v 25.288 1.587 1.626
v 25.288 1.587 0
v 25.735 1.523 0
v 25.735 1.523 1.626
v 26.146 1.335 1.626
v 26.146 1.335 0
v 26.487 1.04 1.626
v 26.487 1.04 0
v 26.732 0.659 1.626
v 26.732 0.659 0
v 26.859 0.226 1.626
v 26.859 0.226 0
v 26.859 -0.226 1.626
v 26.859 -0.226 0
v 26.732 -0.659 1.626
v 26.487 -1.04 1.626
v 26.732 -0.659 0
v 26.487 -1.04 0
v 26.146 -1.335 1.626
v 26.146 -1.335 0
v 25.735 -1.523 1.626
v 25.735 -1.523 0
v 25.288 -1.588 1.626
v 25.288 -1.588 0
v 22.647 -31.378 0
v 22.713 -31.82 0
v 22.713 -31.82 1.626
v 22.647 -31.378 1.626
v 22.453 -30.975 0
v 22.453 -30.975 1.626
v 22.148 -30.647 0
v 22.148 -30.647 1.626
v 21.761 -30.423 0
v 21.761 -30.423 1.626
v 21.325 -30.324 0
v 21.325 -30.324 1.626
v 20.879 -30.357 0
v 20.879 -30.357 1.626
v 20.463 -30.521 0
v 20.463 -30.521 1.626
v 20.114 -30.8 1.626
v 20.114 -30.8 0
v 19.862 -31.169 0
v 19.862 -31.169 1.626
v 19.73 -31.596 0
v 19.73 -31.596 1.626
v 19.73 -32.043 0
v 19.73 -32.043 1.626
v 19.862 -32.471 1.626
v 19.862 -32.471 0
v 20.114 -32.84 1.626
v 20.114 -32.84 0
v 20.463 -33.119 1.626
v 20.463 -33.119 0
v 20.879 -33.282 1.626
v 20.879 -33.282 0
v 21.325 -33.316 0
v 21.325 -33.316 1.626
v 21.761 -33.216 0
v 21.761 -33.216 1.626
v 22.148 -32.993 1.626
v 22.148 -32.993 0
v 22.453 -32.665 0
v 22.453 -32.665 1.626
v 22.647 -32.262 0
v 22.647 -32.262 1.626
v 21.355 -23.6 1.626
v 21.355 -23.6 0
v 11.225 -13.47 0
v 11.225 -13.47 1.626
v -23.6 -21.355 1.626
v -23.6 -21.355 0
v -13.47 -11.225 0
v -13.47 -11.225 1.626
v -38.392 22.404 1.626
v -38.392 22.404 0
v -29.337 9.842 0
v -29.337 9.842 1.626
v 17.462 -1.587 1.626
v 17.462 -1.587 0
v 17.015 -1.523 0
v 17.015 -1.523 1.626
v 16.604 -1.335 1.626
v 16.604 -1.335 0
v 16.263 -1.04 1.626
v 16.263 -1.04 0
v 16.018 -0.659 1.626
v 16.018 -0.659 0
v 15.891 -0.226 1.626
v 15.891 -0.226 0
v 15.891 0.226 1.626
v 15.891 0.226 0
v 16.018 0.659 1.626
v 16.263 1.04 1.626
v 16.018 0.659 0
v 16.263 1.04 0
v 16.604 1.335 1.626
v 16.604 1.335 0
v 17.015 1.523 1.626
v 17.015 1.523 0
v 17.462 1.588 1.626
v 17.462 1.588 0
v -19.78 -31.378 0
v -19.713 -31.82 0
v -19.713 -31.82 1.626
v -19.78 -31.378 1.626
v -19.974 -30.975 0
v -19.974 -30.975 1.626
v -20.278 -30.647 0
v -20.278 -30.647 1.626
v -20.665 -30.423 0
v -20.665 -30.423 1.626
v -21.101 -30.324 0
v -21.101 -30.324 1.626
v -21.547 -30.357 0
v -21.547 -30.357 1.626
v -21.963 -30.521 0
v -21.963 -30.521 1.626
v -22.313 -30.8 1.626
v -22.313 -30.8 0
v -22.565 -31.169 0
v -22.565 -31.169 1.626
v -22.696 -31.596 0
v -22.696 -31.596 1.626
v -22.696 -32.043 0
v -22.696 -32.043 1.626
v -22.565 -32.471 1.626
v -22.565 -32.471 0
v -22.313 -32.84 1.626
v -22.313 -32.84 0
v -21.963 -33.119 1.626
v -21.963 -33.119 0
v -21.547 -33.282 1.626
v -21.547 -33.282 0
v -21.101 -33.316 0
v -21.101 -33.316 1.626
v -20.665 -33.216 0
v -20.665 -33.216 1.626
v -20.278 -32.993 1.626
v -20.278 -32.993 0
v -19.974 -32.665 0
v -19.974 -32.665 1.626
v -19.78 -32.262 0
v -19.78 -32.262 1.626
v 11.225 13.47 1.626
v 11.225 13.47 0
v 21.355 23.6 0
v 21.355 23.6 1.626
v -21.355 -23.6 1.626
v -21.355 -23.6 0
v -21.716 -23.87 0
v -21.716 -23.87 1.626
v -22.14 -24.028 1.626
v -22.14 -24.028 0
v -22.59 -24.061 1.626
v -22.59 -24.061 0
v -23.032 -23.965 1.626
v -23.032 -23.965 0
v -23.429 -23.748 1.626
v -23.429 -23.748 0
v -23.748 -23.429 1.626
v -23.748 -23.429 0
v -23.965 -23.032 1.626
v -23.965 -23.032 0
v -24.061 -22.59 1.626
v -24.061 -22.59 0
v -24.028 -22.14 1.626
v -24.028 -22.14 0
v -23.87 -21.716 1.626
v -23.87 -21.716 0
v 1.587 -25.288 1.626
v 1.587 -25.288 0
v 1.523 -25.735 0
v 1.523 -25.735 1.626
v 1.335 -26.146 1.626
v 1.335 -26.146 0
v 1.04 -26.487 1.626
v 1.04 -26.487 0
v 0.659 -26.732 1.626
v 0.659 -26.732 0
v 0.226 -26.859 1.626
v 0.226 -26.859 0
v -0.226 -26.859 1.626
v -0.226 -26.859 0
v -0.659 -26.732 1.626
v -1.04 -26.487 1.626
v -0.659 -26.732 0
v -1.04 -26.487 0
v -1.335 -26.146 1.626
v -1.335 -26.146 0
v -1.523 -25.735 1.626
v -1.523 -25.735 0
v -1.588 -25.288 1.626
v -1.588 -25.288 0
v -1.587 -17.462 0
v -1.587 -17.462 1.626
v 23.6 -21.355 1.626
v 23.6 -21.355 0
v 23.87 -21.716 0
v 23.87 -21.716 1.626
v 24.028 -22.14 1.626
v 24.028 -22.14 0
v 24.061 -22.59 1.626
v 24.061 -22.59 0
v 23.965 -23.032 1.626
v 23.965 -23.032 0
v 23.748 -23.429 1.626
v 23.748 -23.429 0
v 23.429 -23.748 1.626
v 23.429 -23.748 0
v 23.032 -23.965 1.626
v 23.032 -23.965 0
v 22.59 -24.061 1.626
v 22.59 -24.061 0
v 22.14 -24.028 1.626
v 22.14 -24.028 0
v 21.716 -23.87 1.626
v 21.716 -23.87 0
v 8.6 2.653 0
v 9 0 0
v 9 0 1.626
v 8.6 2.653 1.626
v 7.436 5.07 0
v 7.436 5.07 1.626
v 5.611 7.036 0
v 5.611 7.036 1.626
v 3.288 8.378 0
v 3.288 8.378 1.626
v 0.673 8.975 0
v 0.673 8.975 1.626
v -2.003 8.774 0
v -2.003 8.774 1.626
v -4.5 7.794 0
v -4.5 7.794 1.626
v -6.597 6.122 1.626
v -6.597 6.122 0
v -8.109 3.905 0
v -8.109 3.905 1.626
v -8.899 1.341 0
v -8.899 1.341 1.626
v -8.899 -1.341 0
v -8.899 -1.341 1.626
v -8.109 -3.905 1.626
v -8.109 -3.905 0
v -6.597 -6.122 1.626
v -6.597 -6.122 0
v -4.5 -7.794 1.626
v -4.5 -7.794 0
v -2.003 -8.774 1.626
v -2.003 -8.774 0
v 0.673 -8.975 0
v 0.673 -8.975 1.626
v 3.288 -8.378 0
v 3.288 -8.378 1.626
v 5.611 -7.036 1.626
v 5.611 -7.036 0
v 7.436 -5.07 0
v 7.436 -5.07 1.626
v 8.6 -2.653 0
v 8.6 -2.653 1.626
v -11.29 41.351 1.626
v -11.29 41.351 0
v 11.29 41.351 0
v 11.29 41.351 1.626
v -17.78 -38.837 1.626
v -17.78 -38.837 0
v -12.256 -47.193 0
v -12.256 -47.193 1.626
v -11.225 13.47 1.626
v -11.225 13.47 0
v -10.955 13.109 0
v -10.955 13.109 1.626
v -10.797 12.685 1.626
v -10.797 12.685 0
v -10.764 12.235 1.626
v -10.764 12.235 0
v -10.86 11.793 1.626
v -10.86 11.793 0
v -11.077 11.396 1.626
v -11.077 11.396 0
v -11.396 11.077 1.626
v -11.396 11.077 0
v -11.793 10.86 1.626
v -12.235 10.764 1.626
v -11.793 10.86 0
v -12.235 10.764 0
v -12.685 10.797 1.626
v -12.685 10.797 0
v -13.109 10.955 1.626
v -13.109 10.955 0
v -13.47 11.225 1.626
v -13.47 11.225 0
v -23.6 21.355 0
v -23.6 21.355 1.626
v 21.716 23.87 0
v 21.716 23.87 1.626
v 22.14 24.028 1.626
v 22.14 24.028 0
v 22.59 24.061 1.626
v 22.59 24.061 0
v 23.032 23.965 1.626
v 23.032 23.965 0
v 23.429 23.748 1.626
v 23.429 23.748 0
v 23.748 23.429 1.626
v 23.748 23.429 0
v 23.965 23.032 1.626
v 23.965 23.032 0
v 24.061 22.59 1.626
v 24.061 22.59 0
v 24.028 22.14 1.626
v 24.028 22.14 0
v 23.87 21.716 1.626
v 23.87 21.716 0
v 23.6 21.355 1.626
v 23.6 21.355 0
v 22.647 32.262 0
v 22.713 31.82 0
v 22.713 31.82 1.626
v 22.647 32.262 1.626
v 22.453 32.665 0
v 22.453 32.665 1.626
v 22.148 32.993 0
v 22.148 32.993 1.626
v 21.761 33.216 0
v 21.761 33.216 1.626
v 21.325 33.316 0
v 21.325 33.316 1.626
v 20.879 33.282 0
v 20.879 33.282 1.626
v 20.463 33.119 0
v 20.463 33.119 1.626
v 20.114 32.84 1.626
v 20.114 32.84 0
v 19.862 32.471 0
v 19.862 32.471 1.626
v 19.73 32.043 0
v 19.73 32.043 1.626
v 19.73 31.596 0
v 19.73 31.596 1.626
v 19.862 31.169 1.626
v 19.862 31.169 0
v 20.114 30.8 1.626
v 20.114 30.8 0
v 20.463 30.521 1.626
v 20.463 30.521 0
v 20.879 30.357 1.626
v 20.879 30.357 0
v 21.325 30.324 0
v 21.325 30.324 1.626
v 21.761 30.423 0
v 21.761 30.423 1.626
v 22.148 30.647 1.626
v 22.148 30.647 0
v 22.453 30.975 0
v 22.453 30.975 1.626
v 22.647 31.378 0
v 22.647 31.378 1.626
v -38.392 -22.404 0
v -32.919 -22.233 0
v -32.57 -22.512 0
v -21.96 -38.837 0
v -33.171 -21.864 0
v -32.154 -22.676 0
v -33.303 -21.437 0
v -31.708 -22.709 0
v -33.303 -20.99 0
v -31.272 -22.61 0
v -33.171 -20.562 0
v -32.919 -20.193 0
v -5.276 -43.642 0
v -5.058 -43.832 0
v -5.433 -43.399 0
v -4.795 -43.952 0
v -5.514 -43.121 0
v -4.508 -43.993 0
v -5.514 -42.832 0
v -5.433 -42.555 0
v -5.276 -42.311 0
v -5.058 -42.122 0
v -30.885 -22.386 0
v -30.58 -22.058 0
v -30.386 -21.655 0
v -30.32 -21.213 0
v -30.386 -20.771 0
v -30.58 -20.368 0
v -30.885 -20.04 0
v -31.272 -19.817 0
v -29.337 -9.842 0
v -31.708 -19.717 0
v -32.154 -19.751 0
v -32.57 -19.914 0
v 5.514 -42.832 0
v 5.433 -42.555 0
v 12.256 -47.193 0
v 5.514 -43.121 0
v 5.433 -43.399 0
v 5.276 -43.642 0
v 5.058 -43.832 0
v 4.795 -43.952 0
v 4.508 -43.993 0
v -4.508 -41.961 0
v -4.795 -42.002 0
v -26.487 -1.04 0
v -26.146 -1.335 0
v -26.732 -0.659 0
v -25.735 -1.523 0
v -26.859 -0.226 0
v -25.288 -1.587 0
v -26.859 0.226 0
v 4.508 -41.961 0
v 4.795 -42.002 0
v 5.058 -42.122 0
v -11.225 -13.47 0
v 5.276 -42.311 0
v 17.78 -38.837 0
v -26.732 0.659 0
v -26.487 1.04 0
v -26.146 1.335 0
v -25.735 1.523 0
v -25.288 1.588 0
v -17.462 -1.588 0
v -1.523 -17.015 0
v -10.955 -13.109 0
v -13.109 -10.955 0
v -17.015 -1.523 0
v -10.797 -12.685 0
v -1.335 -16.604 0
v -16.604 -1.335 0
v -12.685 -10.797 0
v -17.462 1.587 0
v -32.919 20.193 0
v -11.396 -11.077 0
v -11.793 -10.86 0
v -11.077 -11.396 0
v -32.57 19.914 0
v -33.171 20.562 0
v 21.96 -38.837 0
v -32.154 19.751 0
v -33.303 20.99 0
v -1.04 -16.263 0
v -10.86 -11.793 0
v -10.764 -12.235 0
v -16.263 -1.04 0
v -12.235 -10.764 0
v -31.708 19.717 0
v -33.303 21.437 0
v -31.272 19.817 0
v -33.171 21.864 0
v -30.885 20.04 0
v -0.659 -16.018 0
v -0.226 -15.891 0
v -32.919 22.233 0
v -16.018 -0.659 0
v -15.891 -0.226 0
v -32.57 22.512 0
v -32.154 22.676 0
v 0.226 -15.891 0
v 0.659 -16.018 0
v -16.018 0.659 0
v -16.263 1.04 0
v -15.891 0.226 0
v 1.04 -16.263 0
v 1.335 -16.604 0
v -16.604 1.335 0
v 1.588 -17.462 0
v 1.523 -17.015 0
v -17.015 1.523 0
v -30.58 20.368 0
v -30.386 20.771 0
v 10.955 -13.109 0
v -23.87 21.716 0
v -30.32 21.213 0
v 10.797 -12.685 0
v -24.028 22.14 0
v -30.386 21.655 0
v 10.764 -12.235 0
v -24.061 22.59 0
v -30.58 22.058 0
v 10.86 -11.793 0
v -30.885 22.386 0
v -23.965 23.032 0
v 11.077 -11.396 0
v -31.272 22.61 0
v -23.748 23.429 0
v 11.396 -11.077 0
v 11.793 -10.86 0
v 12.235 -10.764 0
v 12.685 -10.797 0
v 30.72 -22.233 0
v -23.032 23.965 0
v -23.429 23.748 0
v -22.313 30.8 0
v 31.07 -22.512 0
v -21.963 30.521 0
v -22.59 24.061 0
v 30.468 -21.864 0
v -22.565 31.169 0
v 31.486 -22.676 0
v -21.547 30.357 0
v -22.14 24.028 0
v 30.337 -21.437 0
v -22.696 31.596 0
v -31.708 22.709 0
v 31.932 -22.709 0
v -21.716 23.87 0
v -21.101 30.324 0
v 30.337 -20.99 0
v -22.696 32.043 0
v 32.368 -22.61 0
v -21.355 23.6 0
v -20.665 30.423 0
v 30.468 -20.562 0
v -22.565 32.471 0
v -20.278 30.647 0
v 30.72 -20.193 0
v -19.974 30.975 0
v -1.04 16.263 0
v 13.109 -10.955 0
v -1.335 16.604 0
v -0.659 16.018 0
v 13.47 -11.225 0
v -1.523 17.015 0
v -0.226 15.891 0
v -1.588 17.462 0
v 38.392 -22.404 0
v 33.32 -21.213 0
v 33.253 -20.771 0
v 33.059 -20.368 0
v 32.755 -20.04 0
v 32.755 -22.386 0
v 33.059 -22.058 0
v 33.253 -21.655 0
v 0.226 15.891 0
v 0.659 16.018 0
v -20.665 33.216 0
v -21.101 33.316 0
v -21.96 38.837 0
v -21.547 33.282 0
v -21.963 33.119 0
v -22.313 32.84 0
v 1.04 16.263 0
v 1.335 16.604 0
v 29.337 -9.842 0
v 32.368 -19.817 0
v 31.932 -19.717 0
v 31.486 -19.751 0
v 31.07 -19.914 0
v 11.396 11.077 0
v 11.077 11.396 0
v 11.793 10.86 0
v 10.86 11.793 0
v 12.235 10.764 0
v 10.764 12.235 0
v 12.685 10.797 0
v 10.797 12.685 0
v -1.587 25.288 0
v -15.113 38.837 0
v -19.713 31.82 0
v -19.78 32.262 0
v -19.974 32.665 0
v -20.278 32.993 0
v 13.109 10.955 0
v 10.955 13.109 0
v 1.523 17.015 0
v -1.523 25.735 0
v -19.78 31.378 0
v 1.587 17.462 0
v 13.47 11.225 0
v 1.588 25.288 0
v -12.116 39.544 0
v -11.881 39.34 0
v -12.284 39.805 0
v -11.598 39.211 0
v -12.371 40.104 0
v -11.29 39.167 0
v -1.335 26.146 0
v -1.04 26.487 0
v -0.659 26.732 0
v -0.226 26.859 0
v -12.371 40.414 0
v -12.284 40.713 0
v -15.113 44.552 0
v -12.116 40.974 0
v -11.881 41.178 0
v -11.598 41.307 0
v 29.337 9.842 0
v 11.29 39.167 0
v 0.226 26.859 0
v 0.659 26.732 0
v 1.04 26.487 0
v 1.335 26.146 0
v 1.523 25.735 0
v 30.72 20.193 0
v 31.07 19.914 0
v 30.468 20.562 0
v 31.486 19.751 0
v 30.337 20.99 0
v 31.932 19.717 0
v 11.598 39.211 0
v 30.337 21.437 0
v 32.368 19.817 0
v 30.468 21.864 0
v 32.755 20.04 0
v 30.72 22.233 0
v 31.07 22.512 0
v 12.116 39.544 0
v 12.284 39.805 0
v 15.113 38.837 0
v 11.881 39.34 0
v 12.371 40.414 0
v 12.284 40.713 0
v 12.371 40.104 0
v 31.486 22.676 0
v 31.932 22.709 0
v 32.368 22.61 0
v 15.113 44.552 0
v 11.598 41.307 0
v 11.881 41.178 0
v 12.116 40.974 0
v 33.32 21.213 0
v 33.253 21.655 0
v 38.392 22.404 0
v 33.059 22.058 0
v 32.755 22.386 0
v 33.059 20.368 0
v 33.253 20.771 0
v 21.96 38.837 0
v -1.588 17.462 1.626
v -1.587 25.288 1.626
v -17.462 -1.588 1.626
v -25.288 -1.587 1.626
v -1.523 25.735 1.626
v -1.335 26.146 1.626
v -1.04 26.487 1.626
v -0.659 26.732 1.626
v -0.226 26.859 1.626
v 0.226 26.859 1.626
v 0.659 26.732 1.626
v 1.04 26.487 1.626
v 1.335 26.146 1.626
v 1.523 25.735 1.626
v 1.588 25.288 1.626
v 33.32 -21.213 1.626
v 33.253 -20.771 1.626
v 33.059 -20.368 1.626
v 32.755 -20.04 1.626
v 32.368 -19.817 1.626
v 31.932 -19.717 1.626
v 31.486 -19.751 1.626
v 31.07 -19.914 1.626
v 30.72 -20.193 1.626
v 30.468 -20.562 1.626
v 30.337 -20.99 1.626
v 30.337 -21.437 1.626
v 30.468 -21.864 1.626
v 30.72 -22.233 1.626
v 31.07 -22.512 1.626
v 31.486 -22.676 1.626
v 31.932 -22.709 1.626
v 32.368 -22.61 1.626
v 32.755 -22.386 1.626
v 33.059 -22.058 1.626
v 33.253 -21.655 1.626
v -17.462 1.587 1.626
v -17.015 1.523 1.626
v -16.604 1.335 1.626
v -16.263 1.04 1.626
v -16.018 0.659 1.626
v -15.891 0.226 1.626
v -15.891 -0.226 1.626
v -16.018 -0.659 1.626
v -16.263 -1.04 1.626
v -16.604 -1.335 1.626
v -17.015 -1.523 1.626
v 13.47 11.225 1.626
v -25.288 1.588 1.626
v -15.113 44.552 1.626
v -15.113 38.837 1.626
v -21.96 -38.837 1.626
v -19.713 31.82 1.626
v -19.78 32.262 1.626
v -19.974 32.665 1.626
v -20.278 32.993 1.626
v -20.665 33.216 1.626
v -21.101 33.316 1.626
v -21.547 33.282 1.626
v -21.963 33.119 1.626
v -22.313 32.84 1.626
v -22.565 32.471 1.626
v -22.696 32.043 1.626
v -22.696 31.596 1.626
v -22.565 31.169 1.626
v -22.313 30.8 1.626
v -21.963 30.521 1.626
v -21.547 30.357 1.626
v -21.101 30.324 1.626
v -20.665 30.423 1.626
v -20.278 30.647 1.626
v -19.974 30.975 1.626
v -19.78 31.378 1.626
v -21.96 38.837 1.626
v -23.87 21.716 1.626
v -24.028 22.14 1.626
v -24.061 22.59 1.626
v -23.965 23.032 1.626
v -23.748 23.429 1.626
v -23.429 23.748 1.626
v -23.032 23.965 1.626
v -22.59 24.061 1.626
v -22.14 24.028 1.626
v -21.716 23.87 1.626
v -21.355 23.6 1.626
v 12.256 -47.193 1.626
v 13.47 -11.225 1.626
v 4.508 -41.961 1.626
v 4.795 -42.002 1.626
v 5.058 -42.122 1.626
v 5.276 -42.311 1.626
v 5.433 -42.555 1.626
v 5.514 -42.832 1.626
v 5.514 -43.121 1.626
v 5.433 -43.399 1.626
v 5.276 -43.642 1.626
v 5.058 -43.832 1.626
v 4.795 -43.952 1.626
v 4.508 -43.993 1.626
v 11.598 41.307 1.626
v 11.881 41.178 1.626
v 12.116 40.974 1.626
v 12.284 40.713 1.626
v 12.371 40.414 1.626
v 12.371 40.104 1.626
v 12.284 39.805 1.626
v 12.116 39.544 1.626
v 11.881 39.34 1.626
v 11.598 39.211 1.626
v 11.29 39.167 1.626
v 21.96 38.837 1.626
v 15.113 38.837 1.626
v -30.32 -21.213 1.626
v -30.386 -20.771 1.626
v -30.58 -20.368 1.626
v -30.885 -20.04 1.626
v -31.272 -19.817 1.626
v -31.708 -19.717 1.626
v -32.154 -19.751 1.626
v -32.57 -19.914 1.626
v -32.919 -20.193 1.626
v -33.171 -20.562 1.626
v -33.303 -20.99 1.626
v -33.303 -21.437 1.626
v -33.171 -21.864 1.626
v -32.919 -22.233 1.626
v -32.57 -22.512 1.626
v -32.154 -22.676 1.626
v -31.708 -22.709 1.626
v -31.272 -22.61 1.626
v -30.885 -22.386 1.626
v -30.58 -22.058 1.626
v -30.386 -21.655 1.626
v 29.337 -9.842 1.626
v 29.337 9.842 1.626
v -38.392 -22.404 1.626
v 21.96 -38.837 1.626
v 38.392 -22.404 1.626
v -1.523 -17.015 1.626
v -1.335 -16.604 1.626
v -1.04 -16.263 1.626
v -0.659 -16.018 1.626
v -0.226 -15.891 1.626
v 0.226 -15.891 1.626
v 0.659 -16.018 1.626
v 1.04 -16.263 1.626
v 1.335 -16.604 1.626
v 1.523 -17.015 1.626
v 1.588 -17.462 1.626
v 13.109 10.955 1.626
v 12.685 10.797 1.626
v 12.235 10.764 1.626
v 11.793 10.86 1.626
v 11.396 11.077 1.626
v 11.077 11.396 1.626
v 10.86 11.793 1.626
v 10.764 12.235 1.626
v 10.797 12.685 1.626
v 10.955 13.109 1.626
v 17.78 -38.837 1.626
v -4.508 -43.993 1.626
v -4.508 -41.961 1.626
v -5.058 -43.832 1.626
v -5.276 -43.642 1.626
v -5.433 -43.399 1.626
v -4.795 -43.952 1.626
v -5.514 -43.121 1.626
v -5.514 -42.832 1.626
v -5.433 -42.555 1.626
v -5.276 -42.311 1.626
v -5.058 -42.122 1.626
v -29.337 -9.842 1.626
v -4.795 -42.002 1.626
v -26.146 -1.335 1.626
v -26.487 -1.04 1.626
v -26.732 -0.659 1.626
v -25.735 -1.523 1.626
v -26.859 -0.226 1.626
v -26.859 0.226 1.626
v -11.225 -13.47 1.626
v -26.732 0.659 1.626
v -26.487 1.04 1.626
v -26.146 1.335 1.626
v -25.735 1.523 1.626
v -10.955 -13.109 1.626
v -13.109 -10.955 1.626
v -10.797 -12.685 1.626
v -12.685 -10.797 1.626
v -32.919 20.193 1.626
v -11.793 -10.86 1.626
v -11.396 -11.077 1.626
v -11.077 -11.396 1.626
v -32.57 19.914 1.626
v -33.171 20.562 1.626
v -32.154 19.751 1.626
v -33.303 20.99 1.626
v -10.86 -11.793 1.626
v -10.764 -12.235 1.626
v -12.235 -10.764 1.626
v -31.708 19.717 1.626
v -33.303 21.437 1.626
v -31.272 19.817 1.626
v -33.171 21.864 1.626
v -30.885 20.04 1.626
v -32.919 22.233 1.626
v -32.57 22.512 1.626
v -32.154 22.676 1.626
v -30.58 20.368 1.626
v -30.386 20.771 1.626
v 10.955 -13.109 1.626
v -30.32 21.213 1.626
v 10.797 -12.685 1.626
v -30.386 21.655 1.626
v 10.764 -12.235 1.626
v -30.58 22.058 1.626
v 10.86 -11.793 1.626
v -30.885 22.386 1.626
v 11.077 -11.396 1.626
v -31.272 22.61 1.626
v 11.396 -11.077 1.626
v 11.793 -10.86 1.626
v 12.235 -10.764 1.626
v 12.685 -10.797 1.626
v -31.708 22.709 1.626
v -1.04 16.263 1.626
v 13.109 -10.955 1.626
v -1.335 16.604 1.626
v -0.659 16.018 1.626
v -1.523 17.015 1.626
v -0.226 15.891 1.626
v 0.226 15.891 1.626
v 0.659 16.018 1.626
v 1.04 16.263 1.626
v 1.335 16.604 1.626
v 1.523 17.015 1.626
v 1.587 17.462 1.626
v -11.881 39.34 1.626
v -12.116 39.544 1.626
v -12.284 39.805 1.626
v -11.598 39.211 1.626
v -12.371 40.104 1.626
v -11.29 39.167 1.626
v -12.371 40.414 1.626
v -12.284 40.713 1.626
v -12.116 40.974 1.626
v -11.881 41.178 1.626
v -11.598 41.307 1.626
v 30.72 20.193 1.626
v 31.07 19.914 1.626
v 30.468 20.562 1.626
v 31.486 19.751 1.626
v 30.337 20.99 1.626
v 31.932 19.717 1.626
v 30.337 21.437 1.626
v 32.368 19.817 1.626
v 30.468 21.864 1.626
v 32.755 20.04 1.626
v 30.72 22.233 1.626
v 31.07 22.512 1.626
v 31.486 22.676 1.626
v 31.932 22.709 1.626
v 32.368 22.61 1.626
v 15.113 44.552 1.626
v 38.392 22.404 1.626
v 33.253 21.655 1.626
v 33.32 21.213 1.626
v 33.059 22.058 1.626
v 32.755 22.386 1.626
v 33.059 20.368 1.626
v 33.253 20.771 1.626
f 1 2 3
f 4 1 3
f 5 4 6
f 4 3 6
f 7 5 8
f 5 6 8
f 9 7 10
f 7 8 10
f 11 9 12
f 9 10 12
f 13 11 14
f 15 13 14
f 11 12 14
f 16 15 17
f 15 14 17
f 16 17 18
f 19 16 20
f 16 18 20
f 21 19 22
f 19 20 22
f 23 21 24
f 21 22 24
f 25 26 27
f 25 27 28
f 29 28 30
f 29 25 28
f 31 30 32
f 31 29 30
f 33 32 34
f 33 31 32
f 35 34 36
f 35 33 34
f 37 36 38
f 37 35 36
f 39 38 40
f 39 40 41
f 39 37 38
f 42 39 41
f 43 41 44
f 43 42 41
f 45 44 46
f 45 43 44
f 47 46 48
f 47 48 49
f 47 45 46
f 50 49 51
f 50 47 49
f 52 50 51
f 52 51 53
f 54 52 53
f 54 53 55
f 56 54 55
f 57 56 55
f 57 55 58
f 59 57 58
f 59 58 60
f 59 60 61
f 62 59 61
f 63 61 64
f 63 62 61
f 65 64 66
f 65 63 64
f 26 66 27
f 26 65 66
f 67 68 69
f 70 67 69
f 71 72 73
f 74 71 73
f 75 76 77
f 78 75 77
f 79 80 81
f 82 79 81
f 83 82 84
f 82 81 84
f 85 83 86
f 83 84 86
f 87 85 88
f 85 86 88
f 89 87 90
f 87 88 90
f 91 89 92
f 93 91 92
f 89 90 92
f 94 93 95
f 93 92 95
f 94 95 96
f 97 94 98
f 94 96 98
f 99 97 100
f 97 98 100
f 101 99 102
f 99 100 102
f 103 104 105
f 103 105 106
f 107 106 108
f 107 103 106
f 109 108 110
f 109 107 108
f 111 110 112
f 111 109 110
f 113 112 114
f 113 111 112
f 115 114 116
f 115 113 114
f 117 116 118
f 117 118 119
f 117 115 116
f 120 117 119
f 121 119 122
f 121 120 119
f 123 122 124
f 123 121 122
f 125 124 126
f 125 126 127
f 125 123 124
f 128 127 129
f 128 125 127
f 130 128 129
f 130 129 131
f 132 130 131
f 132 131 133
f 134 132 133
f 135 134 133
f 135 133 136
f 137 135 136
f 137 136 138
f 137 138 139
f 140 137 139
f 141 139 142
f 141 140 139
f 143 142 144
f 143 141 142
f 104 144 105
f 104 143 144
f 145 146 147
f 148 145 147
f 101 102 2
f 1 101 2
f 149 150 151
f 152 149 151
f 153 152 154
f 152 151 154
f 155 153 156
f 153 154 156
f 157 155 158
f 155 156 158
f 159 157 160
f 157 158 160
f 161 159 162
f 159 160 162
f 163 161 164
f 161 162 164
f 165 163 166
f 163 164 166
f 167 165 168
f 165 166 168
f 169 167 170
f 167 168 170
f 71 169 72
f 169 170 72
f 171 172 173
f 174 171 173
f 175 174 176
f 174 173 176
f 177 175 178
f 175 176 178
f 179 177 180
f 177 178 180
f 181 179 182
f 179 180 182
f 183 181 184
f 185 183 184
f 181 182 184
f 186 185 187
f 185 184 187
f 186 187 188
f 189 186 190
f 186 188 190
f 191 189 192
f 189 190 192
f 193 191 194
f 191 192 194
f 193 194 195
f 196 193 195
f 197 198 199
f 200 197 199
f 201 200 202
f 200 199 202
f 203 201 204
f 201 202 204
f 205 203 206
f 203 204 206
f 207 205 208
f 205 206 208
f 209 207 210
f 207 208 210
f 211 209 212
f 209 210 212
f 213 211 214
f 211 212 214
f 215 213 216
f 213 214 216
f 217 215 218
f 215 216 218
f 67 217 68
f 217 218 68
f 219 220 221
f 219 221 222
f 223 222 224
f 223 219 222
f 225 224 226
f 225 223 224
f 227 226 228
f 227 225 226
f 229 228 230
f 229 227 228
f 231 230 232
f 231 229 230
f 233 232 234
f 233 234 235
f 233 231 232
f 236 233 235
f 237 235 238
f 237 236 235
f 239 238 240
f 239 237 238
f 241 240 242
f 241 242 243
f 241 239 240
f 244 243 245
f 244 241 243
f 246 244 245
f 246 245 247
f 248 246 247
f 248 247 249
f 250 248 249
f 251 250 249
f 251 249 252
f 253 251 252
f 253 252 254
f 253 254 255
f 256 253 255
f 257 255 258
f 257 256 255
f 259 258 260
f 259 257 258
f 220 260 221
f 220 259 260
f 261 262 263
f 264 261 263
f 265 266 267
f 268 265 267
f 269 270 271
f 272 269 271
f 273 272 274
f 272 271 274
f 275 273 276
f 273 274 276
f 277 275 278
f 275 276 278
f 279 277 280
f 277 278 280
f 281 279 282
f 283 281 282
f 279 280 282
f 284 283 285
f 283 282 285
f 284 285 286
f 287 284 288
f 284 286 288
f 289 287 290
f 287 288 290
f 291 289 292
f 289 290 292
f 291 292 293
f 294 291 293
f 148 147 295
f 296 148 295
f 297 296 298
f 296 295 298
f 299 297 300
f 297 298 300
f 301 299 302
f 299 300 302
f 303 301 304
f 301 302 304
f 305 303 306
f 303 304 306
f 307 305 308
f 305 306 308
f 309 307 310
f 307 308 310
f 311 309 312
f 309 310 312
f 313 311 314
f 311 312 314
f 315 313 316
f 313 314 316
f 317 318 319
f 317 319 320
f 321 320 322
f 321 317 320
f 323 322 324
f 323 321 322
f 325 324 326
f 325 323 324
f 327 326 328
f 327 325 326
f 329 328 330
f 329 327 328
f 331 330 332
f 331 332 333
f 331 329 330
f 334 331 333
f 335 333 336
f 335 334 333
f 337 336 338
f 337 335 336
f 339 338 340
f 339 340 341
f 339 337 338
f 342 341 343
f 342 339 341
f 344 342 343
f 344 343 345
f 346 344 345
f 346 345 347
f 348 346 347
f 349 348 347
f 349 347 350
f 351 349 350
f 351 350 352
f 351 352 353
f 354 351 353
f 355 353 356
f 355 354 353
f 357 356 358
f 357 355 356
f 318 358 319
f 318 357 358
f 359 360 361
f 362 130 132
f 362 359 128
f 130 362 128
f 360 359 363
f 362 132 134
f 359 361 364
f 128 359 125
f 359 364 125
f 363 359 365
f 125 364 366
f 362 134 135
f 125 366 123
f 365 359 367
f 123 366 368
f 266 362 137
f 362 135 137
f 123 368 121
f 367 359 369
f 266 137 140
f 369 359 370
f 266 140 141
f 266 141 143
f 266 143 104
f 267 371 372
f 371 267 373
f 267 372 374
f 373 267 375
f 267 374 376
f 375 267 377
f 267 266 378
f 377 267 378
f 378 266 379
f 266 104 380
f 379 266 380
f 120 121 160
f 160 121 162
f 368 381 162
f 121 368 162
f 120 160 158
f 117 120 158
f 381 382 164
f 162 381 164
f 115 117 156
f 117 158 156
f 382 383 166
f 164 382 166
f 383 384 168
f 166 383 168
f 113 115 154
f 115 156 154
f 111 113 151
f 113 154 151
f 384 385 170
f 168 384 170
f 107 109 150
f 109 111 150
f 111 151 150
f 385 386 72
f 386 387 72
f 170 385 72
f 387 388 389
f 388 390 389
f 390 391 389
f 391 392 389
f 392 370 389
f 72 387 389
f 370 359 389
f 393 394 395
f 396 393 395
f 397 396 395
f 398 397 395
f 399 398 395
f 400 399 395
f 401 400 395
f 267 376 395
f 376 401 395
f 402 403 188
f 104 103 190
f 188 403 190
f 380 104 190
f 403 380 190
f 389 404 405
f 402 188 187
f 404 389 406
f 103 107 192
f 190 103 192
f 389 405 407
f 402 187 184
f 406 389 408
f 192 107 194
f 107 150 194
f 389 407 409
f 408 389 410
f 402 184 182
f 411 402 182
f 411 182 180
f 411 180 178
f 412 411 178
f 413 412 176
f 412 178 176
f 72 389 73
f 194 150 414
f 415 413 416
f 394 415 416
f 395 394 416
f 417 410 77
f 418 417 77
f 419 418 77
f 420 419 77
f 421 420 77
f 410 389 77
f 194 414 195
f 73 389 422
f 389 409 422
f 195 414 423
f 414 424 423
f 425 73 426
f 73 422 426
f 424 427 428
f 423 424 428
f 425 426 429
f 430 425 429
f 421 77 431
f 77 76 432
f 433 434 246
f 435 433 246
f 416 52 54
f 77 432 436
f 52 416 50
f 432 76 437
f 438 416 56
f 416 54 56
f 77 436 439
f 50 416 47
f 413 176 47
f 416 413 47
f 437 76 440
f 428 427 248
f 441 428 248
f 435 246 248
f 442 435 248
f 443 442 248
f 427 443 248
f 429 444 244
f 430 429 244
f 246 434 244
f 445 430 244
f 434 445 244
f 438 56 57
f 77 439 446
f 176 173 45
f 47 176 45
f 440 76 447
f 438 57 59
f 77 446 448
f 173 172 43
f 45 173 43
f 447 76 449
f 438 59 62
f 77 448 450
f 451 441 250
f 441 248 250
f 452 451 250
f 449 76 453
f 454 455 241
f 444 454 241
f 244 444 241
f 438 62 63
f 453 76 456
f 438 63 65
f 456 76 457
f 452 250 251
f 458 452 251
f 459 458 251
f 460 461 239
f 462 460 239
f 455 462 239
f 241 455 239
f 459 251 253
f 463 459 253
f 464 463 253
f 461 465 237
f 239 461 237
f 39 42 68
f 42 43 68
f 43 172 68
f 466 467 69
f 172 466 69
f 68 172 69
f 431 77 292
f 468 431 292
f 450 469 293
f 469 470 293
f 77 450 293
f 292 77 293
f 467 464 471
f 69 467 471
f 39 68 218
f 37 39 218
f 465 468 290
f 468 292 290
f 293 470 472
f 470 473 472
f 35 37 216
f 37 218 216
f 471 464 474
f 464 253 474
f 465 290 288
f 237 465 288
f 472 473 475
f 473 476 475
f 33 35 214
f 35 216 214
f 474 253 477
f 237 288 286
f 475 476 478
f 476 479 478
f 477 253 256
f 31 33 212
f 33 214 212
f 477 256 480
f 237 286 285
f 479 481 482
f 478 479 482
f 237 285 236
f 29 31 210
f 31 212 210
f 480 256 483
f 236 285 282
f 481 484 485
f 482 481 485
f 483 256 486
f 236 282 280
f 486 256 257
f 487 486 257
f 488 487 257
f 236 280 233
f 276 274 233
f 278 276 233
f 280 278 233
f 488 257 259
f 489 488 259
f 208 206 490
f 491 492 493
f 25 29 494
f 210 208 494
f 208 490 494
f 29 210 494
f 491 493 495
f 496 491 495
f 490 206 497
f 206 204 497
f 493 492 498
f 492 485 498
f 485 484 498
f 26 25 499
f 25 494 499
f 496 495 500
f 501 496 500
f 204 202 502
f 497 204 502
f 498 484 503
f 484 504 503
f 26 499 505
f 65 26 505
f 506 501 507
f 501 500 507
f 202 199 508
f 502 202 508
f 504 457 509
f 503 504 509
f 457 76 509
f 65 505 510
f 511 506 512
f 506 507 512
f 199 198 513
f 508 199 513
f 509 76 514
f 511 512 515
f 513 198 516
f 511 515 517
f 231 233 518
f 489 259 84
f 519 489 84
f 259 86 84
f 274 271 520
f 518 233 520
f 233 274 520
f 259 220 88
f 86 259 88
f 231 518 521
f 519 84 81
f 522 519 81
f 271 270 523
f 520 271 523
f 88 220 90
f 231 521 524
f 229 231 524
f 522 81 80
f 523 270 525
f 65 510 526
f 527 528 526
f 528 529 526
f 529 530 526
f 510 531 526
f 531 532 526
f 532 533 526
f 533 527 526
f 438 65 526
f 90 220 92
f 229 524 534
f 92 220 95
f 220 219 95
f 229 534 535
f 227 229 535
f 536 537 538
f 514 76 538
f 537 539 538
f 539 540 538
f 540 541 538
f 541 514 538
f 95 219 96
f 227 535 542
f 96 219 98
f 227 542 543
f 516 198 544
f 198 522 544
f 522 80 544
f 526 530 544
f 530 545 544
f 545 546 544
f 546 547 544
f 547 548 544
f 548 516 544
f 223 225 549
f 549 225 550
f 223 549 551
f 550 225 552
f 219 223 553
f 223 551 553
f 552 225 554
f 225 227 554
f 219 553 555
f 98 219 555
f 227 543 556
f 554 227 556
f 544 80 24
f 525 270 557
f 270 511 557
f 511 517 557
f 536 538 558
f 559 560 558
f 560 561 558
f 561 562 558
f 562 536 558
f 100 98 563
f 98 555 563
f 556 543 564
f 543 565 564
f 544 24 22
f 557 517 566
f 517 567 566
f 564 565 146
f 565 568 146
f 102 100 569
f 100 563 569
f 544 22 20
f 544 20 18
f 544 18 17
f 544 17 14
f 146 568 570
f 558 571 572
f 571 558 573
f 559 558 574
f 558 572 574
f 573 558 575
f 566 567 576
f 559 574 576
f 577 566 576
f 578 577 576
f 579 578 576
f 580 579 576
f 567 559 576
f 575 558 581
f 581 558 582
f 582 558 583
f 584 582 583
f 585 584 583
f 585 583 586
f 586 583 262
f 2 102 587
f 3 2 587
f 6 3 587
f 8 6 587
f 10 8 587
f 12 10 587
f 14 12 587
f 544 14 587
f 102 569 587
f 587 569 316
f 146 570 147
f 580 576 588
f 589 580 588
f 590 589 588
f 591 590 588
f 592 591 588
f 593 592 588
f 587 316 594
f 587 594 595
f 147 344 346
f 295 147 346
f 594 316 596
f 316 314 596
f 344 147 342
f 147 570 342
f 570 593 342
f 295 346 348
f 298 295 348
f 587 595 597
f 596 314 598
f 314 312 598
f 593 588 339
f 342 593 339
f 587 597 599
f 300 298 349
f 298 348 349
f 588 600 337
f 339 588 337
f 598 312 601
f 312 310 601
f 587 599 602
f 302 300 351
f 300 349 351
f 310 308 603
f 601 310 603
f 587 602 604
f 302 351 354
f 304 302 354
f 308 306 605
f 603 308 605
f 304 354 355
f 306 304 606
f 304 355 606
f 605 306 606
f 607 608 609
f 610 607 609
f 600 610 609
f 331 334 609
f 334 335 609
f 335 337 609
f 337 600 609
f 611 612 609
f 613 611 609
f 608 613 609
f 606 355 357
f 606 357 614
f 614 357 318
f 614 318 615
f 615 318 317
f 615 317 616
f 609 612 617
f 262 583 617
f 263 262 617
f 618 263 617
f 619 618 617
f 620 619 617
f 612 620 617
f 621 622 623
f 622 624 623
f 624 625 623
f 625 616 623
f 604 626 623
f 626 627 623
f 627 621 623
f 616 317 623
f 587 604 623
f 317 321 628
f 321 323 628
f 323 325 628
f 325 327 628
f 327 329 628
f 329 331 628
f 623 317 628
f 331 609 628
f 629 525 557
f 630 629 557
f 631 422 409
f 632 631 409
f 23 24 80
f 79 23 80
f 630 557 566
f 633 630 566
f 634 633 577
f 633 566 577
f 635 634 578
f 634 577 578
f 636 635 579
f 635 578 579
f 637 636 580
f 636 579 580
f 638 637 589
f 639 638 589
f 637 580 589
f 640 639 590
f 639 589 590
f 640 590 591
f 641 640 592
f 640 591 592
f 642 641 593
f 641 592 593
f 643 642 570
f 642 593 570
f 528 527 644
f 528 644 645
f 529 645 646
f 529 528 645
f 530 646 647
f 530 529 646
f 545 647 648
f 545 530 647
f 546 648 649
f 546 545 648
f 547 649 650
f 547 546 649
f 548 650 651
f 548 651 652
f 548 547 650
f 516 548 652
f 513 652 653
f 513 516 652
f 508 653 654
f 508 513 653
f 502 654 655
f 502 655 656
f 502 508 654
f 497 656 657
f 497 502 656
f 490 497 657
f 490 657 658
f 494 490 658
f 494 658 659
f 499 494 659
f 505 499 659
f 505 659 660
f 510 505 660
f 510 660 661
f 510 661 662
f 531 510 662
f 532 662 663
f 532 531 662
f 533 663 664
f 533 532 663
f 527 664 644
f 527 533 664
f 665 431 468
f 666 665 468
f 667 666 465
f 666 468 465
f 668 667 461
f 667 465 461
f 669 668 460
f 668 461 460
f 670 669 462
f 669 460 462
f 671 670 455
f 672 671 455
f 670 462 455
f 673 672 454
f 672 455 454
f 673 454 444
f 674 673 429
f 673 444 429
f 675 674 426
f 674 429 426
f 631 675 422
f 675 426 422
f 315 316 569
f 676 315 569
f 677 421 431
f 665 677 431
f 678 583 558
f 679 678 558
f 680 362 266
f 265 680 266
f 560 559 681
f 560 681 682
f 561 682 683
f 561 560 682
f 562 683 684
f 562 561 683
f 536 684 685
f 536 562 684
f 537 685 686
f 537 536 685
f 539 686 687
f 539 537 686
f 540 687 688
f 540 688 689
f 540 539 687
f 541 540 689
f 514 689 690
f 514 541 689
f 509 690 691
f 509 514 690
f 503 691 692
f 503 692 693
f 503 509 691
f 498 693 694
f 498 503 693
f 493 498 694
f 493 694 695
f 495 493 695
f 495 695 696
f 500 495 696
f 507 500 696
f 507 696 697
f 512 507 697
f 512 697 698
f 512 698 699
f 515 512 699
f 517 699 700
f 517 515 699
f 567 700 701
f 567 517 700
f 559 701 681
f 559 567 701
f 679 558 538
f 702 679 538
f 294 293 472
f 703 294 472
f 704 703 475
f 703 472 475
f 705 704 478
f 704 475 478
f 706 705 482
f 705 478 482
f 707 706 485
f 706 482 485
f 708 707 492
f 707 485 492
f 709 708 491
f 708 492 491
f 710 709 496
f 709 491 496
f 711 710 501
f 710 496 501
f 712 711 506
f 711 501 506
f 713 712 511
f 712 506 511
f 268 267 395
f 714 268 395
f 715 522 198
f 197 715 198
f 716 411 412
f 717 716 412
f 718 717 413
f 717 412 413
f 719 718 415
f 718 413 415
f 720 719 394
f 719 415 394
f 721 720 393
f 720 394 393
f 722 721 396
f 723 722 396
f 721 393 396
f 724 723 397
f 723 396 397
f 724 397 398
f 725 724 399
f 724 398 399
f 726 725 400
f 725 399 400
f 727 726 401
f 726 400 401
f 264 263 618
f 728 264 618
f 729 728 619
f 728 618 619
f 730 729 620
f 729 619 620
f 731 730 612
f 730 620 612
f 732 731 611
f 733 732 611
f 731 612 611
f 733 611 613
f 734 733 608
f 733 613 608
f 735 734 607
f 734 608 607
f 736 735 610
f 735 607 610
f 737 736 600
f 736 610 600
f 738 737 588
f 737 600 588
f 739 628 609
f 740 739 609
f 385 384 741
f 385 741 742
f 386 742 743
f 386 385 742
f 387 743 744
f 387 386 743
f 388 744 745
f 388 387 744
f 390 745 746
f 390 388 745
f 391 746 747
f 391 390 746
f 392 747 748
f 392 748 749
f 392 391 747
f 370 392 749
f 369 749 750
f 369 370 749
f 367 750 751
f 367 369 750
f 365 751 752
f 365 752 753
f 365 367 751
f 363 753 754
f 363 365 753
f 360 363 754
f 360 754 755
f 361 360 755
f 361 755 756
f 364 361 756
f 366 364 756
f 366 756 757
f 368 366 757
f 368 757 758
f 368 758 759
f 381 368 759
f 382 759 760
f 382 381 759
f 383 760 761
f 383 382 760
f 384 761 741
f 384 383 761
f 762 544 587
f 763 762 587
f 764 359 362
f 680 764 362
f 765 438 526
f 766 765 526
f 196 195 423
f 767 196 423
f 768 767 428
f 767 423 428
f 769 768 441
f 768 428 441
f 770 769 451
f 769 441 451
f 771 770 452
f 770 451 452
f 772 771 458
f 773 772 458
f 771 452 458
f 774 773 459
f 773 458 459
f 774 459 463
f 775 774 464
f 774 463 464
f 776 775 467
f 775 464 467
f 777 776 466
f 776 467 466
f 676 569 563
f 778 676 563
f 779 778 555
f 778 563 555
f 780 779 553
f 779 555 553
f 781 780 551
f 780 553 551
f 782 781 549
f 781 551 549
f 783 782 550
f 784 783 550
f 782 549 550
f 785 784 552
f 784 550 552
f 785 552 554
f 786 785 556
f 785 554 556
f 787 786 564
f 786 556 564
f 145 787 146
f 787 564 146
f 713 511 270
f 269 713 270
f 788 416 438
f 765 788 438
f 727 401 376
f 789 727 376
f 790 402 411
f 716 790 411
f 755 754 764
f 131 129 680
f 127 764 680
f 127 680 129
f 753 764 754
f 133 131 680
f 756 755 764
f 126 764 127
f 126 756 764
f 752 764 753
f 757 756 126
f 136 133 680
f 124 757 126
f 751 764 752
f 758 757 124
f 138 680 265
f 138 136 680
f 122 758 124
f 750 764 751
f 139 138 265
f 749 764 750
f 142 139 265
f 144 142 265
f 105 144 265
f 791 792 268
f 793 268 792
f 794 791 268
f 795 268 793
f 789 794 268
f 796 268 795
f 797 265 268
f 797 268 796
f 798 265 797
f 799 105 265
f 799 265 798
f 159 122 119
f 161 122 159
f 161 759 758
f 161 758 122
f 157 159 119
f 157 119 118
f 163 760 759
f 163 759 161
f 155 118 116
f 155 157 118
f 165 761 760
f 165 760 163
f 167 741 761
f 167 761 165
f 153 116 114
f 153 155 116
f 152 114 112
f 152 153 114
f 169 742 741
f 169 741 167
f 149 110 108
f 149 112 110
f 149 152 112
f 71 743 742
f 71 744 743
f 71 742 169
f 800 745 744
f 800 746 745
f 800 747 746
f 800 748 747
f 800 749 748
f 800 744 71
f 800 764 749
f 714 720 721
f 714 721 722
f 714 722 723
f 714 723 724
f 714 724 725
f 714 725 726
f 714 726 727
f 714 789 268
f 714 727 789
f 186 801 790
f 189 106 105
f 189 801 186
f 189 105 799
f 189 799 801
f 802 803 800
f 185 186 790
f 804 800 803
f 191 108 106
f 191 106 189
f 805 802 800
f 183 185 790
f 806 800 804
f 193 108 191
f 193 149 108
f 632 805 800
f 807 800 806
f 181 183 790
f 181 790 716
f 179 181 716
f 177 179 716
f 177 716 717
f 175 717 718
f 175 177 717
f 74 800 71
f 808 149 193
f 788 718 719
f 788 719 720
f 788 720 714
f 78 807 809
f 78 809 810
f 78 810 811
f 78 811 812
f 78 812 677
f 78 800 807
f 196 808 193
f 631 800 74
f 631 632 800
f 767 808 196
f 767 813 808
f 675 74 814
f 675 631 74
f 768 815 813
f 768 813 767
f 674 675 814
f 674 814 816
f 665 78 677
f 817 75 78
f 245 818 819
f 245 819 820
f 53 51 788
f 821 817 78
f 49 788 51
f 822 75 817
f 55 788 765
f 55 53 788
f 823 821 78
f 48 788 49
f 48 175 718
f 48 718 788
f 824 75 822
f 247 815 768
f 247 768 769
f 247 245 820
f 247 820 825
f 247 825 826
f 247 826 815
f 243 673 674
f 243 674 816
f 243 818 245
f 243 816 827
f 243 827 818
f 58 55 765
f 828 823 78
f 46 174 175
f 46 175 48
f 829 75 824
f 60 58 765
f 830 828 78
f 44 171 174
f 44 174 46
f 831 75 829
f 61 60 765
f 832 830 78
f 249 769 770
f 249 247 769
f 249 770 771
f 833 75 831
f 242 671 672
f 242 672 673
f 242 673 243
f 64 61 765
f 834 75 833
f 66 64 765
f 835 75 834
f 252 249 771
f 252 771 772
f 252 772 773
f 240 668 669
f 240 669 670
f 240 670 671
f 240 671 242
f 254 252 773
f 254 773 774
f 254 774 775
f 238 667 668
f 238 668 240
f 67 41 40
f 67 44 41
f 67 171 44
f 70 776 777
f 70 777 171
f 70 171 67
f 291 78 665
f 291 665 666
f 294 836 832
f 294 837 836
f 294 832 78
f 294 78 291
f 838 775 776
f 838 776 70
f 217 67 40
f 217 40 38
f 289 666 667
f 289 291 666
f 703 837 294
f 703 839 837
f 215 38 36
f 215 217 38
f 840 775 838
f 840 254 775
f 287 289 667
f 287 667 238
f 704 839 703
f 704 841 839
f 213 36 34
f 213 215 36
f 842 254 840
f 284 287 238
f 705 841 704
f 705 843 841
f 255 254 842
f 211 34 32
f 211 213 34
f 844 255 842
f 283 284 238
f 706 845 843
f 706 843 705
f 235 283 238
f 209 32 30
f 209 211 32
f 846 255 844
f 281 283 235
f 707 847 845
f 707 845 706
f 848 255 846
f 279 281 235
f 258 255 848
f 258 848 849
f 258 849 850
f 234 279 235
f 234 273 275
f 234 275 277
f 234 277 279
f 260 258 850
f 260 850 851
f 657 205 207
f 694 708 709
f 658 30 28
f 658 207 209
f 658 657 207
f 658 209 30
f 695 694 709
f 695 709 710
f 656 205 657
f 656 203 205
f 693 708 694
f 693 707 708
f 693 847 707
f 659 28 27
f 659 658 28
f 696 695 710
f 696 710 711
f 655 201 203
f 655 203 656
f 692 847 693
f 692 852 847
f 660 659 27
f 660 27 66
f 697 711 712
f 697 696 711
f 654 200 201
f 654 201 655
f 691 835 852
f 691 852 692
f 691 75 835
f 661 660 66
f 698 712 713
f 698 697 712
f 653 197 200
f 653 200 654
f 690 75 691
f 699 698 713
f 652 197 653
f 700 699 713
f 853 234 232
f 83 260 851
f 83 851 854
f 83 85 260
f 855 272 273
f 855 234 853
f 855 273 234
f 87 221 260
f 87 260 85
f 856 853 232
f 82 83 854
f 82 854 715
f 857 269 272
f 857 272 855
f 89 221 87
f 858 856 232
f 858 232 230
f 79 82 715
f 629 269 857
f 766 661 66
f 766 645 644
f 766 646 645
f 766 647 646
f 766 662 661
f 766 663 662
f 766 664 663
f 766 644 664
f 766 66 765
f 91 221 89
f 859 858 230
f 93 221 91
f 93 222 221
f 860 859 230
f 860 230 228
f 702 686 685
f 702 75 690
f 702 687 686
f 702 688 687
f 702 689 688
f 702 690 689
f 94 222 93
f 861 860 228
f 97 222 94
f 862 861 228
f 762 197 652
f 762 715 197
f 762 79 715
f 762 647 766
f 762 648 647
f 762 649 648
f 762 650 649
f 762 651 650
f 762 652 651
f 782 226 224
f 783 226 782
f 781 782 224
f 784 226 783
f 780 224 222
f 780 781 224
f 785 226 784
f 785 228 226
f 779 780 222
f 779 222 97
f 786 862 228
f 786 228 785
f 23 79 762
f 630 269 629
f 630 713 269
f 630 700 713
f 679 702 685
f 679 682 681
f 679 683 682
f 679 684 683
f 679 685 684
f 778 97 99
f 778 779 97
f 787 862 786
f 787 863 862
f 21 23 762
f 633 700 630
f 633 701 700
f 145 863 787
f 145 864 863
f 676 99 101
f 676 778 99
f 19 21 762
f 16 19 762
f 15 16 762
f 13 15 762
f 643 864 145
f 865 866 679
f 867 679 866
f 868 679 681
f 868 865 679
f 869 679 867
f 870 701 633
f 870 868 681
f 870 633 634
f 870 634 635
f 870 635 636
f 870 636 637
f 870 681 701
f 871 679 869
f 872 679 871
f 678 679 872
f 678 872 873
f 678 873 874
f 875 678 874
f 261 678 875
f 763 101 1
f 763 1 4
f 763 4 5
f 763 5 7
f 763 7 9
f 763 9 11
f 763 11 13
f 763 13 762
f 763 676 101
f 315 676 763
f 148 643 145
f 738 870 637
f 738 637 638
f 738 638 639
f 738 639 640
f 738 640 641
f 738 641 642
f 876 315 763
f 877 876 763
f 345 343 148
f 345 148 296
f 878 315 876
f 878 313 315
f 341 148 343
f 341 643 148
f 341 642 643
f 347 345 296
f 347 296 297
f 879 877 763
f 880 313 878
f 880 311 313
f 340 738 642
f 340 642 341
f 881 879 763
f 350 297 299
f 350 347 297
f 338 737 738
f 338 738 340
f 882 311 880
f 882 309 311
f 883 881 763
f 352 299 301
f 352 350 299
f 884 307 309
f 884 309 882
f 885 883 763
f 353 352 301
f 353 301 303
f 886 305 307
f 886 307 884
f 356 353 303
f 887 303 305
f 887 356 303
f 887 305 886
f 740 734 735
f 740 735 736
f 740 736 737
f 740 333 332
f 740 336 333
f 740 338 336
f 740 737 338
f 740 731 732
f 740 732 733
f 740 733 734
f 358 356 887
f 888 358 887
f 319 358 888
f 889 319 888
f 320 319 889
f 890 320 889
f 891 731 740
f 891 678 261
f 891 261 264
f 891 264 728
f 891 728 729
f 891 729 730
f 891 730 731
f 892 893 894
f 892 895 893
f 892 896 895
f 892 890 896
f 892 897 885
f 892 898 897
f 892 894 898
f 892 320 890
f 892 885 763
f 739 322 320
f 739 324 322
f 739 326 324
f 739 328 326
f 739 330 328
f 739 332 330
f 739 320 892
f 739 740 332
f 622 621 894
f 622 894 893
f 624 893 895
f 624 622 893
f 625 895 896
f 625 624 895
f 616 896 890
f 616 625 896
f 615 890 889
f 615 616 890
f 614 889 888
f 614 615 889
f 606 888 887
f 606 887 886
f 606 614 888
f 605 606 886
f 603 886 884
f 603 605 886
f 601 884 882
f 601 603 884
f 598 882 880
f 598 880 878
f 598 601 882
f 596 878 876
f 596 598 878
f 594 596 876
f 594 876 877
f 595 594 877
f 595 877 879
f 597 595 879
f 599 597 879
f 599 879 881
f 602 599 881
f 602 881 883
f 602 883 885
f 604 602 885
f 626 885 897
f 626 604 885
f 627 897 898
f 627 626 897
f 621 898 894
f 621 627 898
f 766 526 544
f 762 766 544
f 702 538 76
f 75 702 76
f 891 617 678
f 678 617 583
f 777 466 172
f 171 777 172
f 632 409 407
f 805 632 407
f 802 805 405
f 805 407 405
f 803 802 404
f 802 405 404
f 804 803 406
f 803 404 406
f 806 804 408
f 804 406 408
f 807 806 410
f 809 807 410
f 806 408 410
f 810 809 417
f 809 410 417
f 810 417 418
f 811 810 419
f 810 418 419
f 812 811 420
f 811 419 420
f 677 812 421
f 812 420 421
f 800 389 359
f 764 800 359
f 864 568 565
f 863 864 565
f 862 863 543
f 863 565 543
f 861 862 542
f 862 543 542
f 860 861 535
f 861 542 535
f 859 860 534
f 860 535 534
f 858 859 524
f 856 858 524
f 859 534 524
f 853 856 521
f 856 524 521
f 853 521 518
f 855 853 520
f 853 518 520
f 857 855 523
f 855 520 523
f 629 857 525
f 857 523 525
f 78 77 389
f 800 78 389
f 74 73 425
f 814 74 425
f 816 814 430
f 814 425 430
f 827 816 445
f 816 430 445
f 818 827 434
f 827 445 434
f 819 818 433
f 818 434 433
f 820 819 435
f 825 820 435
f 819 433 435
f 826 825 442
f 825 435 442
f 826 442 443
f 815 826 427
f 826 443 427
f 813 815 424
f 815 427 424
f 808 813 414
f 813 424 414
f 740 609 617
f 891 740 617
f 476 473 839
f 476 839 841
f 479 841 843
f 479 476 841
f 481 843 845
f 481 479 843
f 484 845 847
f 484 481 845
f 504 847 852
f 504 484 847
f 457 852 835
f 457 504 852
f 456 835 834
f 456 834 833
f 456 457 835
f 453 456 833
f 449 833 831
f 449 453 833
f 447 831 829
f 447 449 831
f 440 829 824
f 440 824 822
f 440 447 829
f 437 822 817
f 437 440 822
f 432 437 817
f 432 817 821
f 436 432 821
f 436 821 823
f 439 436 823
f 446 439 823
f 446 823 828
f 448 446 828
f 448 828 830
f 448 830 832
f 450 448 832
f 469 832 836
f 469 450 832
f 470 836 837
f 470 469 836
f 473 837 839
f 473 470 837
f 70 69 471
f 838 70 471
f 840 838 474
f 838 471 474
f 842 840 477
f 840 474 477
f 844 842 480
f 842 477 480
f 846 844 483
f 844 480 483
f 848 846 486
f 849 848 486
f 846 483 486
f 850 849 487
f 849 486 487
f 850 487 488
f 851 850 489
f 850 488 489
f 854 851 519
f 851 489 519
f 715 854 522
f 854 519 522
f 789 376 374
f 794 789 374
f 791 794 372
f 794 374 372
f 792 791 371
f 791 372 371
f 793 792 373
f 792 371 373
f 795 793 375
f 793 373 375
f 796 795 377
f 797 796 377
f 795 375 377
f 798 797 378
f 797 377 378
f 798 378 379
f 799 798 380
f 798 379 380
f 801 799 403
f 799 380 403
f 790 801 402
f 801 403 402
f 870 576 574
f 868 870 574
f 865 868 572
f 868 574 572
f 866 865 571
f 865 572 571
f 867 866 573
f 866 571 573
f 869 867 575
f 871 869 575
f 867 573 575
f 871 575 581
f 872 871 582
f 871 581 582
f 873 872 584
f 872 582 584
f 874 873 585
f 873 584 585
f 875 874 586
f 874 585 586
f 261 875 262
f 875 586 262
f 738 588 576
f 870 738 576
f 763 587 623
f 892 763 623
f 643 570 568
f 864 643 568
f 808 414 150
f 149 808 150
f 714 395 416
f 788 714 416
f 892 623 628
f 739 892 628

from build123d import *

# Parameters (mm, degrees)
F0_R     = 1.5
F0_R_2   = 9
F1_DEPTH = 1.6256


with BuildPart() as f1:
    # F0 (on Top) → F1 (new body)
    with BuildSketch(Plane.XY):
        Polygon((-29.337, 9.8425), (-29.337, -9.8425), (-38.3921, -22.404234), (-21.959734, -38.8366), (-17.78, -38.8366), (-12.2555, -47.1932), (0, -47.1932), (12.2555, -47.1932), (17.78, -38.8366), (21.959734, -38.8366), (38.3921, -22.404234), (29.337, -9.8425), (29.337, 9.8425), (38.3921, 22.404234), (21.959734, 38.8366), (15.113, 38.8366), (15.113, 44.5516), (0, 44.5516), (-15.113, 44.5516), (-15.113, 38.8366), (-21.959734, 38.8366), (-38.3921, 22.404234), align=None)
        with Locations((-21.213203, -31.819805)):
            Circle(F0_R, mode=Mode.SUBTRACT)
        with Locations((-31.819805, -21.213203)):
            Circle(F0_R, mode=Mode.SUBTRACT)
        with BuildLine():
            ThreePointArc((-21.354625, -23.599689), (-23.599689, -23.599689), (-23.599689, -21.354625))
            Line((-23.599689, -21.354625), (-13.470384, -11.22532))
            ThreePointArc((-13.470384, -11.22532), (-11.22532, -11.22532), (-11.22532, -13.470384))
            Line((-11.22532, -13.470384), (-21.354625, -23.599689))
        make_face(mode=Mode.SUBTRACT)
        with BuildLine():
            ThreePointArc((-4.5085, -43.9928), (-5.5245, -42.9768), (-4.5085, -41.9608))
            Line((-4.5085, -41.9608), (4.5085, -41.9608))
            ThreePointArc((4.5085, -41.9608), (5.5245, -42.9768), (4.5085, -43.9928))
            Line((4.5085, -43.9928), (-4.5085, -43.9928))
        make_face(mode=Mode.SUBTRACT)
        with Locations((21.213203, -31.819805)):
            Circle(F0_R, mode=Mode.SUBTRACT)
        with BuildLine():
            Line((1.5875, -17.4625), (1.5875, -25.2875))
            ThreePointArc((1.5875, -25.2875), (0, -26.875), (-1.5875, -25.2875))
            Line((-1.5875, -25.2875), (-1.5875, -17.4625))
            ThreePointArc((-1.5875, -17.4625), (0, -15.875), (1.5875, -17.4625))
        make_face(mode=Mode.SUBTRACT)
        with BuildLine():
            ThreePointArc((23.599689, -21.354625), (23.599689, -23.599689), (21.354625, -23.599689))
            Line((21.354625, -23.599689), (11.22532, -13.470384))
            ThreePointArc((11.22532, -13.470384), (11.22532, -11.22532), (13.470384, -11.22532))
            Line((13.470384, -11.22532), (23.599689, -21.354625))
        make_face(mode=Mode.SUBTRACT)
        with Locations((31.819805, -21.213203)):
            Circle(F0_R, mode=Mode.SUBTRACT)
        with BuildLine():
            Line((-17.4625, -1.5875), (-25.2875, -1.5875))
            ThreePointArc((-25.2875, -1.5875), (-26.875, 0), (-25.2875, 1.5875))
            Line((-25.2875, 1.5875), (-17.4625, 1.5875))
            ThreePointArc((-17.4625, 1.5875), (-15.875, 0), (-17.4625, -1.5875))
        make_face(mode=Mode.SUBTRACT)
        with Locations((-31.819805, 21.213203)):
            Circle(F0_R, mode=Mode.SUBTRACT)
        with BuildLine():
            Line((-13.470384, 11.22532), (-23.599689, 21.354625))
            ThreePointArc((-23.599689, 21.354625), (-23.599689, 23.599689), (-21.354625, 23.599689))
            Line((-21.354625, 23.599689), (-11.22532, 13.470384))
            ThreePointArc((-11.22532, 13.470384), (-11.22532, 11.22532), (-13.470384, 11.22532))
        make_face(mode=Mode.SUBTRACT)
        with Locations((-21.213203, 31.819805)):
            Circle(F0_R, mode=Mode.SUBTRACT)
        Circle(F0_R_2, mode=Mode.SUBTRACT)
        with BuildLine():
            Line((-1.5875, 17.4625), (-1.5875, 25.2875))
            ThreePointArc((-1.5875, 25.2875), (0, 26.875), (1.5875, 25.2875))
            Line((1.5875, 25.2875), (1.5875, 17.4625))
            ThreePointArc((1.5875, 17.4625), (0, 15.875), (-1.5875, 17.4625))
        make_face(mode=Mode.SUBTRACT)
        with BuildLine():
            ThreePointArc((21.354625, 23.599689), (23.599689, 23.599689), (23.599689, 21.354625))
            Line((23.599689, 21.354625), (13.470384, 11.22532))
            ThreePointArc((13.470384, 11.22532), (11.22532, 11.22532), (11.22532, 13.470384))
            Line((11.22532, 13.470384), (21.354625, 23.599689))
        make_face(mode=Mode.SUBTRACT)
        with BuildLine():
            Line((17.4625, 1.5875), (25.2875, 1.5875))
            ThreePointArc((25.2875, 1.5875), (26.875, 0), (25.2875, -1.5875))
            Line((25.2875, -1.5875), (17.4625, -1.5875))
            ThreePointArc((17.4625, -1.5875), (15.875, 0), (17.4625, 1.5875))
        make_face(mode=Mode.SUBTRACT)
        with Locations((31.819805, 21.213203)):
            Circle(F0_R, mode=Mode.SUBTRACT)
        with BuildLine():
            ThreePointArc((-11.2903, 39.1668), (-12.3825, 40.259), (-11.2903, 41.3512))
            Line((-11.2903, 41.3512), (11.2903, 41.3512))
            ThreePointArc((11.2903, 41.3512), (12.3825, 40.259), (11.2903, 39.1668))
            Line((11.2903, 39.1668), (-11.2903, 39.1668))
        make_face(mode=Mode.SUBTRACT)
        with Locations((21.213203, 31.819805)):
            Circle(F0_R, mode=Mode.SUBTRACT)
    extrude(amount=F1_DEPTH)


solid = f1.part
